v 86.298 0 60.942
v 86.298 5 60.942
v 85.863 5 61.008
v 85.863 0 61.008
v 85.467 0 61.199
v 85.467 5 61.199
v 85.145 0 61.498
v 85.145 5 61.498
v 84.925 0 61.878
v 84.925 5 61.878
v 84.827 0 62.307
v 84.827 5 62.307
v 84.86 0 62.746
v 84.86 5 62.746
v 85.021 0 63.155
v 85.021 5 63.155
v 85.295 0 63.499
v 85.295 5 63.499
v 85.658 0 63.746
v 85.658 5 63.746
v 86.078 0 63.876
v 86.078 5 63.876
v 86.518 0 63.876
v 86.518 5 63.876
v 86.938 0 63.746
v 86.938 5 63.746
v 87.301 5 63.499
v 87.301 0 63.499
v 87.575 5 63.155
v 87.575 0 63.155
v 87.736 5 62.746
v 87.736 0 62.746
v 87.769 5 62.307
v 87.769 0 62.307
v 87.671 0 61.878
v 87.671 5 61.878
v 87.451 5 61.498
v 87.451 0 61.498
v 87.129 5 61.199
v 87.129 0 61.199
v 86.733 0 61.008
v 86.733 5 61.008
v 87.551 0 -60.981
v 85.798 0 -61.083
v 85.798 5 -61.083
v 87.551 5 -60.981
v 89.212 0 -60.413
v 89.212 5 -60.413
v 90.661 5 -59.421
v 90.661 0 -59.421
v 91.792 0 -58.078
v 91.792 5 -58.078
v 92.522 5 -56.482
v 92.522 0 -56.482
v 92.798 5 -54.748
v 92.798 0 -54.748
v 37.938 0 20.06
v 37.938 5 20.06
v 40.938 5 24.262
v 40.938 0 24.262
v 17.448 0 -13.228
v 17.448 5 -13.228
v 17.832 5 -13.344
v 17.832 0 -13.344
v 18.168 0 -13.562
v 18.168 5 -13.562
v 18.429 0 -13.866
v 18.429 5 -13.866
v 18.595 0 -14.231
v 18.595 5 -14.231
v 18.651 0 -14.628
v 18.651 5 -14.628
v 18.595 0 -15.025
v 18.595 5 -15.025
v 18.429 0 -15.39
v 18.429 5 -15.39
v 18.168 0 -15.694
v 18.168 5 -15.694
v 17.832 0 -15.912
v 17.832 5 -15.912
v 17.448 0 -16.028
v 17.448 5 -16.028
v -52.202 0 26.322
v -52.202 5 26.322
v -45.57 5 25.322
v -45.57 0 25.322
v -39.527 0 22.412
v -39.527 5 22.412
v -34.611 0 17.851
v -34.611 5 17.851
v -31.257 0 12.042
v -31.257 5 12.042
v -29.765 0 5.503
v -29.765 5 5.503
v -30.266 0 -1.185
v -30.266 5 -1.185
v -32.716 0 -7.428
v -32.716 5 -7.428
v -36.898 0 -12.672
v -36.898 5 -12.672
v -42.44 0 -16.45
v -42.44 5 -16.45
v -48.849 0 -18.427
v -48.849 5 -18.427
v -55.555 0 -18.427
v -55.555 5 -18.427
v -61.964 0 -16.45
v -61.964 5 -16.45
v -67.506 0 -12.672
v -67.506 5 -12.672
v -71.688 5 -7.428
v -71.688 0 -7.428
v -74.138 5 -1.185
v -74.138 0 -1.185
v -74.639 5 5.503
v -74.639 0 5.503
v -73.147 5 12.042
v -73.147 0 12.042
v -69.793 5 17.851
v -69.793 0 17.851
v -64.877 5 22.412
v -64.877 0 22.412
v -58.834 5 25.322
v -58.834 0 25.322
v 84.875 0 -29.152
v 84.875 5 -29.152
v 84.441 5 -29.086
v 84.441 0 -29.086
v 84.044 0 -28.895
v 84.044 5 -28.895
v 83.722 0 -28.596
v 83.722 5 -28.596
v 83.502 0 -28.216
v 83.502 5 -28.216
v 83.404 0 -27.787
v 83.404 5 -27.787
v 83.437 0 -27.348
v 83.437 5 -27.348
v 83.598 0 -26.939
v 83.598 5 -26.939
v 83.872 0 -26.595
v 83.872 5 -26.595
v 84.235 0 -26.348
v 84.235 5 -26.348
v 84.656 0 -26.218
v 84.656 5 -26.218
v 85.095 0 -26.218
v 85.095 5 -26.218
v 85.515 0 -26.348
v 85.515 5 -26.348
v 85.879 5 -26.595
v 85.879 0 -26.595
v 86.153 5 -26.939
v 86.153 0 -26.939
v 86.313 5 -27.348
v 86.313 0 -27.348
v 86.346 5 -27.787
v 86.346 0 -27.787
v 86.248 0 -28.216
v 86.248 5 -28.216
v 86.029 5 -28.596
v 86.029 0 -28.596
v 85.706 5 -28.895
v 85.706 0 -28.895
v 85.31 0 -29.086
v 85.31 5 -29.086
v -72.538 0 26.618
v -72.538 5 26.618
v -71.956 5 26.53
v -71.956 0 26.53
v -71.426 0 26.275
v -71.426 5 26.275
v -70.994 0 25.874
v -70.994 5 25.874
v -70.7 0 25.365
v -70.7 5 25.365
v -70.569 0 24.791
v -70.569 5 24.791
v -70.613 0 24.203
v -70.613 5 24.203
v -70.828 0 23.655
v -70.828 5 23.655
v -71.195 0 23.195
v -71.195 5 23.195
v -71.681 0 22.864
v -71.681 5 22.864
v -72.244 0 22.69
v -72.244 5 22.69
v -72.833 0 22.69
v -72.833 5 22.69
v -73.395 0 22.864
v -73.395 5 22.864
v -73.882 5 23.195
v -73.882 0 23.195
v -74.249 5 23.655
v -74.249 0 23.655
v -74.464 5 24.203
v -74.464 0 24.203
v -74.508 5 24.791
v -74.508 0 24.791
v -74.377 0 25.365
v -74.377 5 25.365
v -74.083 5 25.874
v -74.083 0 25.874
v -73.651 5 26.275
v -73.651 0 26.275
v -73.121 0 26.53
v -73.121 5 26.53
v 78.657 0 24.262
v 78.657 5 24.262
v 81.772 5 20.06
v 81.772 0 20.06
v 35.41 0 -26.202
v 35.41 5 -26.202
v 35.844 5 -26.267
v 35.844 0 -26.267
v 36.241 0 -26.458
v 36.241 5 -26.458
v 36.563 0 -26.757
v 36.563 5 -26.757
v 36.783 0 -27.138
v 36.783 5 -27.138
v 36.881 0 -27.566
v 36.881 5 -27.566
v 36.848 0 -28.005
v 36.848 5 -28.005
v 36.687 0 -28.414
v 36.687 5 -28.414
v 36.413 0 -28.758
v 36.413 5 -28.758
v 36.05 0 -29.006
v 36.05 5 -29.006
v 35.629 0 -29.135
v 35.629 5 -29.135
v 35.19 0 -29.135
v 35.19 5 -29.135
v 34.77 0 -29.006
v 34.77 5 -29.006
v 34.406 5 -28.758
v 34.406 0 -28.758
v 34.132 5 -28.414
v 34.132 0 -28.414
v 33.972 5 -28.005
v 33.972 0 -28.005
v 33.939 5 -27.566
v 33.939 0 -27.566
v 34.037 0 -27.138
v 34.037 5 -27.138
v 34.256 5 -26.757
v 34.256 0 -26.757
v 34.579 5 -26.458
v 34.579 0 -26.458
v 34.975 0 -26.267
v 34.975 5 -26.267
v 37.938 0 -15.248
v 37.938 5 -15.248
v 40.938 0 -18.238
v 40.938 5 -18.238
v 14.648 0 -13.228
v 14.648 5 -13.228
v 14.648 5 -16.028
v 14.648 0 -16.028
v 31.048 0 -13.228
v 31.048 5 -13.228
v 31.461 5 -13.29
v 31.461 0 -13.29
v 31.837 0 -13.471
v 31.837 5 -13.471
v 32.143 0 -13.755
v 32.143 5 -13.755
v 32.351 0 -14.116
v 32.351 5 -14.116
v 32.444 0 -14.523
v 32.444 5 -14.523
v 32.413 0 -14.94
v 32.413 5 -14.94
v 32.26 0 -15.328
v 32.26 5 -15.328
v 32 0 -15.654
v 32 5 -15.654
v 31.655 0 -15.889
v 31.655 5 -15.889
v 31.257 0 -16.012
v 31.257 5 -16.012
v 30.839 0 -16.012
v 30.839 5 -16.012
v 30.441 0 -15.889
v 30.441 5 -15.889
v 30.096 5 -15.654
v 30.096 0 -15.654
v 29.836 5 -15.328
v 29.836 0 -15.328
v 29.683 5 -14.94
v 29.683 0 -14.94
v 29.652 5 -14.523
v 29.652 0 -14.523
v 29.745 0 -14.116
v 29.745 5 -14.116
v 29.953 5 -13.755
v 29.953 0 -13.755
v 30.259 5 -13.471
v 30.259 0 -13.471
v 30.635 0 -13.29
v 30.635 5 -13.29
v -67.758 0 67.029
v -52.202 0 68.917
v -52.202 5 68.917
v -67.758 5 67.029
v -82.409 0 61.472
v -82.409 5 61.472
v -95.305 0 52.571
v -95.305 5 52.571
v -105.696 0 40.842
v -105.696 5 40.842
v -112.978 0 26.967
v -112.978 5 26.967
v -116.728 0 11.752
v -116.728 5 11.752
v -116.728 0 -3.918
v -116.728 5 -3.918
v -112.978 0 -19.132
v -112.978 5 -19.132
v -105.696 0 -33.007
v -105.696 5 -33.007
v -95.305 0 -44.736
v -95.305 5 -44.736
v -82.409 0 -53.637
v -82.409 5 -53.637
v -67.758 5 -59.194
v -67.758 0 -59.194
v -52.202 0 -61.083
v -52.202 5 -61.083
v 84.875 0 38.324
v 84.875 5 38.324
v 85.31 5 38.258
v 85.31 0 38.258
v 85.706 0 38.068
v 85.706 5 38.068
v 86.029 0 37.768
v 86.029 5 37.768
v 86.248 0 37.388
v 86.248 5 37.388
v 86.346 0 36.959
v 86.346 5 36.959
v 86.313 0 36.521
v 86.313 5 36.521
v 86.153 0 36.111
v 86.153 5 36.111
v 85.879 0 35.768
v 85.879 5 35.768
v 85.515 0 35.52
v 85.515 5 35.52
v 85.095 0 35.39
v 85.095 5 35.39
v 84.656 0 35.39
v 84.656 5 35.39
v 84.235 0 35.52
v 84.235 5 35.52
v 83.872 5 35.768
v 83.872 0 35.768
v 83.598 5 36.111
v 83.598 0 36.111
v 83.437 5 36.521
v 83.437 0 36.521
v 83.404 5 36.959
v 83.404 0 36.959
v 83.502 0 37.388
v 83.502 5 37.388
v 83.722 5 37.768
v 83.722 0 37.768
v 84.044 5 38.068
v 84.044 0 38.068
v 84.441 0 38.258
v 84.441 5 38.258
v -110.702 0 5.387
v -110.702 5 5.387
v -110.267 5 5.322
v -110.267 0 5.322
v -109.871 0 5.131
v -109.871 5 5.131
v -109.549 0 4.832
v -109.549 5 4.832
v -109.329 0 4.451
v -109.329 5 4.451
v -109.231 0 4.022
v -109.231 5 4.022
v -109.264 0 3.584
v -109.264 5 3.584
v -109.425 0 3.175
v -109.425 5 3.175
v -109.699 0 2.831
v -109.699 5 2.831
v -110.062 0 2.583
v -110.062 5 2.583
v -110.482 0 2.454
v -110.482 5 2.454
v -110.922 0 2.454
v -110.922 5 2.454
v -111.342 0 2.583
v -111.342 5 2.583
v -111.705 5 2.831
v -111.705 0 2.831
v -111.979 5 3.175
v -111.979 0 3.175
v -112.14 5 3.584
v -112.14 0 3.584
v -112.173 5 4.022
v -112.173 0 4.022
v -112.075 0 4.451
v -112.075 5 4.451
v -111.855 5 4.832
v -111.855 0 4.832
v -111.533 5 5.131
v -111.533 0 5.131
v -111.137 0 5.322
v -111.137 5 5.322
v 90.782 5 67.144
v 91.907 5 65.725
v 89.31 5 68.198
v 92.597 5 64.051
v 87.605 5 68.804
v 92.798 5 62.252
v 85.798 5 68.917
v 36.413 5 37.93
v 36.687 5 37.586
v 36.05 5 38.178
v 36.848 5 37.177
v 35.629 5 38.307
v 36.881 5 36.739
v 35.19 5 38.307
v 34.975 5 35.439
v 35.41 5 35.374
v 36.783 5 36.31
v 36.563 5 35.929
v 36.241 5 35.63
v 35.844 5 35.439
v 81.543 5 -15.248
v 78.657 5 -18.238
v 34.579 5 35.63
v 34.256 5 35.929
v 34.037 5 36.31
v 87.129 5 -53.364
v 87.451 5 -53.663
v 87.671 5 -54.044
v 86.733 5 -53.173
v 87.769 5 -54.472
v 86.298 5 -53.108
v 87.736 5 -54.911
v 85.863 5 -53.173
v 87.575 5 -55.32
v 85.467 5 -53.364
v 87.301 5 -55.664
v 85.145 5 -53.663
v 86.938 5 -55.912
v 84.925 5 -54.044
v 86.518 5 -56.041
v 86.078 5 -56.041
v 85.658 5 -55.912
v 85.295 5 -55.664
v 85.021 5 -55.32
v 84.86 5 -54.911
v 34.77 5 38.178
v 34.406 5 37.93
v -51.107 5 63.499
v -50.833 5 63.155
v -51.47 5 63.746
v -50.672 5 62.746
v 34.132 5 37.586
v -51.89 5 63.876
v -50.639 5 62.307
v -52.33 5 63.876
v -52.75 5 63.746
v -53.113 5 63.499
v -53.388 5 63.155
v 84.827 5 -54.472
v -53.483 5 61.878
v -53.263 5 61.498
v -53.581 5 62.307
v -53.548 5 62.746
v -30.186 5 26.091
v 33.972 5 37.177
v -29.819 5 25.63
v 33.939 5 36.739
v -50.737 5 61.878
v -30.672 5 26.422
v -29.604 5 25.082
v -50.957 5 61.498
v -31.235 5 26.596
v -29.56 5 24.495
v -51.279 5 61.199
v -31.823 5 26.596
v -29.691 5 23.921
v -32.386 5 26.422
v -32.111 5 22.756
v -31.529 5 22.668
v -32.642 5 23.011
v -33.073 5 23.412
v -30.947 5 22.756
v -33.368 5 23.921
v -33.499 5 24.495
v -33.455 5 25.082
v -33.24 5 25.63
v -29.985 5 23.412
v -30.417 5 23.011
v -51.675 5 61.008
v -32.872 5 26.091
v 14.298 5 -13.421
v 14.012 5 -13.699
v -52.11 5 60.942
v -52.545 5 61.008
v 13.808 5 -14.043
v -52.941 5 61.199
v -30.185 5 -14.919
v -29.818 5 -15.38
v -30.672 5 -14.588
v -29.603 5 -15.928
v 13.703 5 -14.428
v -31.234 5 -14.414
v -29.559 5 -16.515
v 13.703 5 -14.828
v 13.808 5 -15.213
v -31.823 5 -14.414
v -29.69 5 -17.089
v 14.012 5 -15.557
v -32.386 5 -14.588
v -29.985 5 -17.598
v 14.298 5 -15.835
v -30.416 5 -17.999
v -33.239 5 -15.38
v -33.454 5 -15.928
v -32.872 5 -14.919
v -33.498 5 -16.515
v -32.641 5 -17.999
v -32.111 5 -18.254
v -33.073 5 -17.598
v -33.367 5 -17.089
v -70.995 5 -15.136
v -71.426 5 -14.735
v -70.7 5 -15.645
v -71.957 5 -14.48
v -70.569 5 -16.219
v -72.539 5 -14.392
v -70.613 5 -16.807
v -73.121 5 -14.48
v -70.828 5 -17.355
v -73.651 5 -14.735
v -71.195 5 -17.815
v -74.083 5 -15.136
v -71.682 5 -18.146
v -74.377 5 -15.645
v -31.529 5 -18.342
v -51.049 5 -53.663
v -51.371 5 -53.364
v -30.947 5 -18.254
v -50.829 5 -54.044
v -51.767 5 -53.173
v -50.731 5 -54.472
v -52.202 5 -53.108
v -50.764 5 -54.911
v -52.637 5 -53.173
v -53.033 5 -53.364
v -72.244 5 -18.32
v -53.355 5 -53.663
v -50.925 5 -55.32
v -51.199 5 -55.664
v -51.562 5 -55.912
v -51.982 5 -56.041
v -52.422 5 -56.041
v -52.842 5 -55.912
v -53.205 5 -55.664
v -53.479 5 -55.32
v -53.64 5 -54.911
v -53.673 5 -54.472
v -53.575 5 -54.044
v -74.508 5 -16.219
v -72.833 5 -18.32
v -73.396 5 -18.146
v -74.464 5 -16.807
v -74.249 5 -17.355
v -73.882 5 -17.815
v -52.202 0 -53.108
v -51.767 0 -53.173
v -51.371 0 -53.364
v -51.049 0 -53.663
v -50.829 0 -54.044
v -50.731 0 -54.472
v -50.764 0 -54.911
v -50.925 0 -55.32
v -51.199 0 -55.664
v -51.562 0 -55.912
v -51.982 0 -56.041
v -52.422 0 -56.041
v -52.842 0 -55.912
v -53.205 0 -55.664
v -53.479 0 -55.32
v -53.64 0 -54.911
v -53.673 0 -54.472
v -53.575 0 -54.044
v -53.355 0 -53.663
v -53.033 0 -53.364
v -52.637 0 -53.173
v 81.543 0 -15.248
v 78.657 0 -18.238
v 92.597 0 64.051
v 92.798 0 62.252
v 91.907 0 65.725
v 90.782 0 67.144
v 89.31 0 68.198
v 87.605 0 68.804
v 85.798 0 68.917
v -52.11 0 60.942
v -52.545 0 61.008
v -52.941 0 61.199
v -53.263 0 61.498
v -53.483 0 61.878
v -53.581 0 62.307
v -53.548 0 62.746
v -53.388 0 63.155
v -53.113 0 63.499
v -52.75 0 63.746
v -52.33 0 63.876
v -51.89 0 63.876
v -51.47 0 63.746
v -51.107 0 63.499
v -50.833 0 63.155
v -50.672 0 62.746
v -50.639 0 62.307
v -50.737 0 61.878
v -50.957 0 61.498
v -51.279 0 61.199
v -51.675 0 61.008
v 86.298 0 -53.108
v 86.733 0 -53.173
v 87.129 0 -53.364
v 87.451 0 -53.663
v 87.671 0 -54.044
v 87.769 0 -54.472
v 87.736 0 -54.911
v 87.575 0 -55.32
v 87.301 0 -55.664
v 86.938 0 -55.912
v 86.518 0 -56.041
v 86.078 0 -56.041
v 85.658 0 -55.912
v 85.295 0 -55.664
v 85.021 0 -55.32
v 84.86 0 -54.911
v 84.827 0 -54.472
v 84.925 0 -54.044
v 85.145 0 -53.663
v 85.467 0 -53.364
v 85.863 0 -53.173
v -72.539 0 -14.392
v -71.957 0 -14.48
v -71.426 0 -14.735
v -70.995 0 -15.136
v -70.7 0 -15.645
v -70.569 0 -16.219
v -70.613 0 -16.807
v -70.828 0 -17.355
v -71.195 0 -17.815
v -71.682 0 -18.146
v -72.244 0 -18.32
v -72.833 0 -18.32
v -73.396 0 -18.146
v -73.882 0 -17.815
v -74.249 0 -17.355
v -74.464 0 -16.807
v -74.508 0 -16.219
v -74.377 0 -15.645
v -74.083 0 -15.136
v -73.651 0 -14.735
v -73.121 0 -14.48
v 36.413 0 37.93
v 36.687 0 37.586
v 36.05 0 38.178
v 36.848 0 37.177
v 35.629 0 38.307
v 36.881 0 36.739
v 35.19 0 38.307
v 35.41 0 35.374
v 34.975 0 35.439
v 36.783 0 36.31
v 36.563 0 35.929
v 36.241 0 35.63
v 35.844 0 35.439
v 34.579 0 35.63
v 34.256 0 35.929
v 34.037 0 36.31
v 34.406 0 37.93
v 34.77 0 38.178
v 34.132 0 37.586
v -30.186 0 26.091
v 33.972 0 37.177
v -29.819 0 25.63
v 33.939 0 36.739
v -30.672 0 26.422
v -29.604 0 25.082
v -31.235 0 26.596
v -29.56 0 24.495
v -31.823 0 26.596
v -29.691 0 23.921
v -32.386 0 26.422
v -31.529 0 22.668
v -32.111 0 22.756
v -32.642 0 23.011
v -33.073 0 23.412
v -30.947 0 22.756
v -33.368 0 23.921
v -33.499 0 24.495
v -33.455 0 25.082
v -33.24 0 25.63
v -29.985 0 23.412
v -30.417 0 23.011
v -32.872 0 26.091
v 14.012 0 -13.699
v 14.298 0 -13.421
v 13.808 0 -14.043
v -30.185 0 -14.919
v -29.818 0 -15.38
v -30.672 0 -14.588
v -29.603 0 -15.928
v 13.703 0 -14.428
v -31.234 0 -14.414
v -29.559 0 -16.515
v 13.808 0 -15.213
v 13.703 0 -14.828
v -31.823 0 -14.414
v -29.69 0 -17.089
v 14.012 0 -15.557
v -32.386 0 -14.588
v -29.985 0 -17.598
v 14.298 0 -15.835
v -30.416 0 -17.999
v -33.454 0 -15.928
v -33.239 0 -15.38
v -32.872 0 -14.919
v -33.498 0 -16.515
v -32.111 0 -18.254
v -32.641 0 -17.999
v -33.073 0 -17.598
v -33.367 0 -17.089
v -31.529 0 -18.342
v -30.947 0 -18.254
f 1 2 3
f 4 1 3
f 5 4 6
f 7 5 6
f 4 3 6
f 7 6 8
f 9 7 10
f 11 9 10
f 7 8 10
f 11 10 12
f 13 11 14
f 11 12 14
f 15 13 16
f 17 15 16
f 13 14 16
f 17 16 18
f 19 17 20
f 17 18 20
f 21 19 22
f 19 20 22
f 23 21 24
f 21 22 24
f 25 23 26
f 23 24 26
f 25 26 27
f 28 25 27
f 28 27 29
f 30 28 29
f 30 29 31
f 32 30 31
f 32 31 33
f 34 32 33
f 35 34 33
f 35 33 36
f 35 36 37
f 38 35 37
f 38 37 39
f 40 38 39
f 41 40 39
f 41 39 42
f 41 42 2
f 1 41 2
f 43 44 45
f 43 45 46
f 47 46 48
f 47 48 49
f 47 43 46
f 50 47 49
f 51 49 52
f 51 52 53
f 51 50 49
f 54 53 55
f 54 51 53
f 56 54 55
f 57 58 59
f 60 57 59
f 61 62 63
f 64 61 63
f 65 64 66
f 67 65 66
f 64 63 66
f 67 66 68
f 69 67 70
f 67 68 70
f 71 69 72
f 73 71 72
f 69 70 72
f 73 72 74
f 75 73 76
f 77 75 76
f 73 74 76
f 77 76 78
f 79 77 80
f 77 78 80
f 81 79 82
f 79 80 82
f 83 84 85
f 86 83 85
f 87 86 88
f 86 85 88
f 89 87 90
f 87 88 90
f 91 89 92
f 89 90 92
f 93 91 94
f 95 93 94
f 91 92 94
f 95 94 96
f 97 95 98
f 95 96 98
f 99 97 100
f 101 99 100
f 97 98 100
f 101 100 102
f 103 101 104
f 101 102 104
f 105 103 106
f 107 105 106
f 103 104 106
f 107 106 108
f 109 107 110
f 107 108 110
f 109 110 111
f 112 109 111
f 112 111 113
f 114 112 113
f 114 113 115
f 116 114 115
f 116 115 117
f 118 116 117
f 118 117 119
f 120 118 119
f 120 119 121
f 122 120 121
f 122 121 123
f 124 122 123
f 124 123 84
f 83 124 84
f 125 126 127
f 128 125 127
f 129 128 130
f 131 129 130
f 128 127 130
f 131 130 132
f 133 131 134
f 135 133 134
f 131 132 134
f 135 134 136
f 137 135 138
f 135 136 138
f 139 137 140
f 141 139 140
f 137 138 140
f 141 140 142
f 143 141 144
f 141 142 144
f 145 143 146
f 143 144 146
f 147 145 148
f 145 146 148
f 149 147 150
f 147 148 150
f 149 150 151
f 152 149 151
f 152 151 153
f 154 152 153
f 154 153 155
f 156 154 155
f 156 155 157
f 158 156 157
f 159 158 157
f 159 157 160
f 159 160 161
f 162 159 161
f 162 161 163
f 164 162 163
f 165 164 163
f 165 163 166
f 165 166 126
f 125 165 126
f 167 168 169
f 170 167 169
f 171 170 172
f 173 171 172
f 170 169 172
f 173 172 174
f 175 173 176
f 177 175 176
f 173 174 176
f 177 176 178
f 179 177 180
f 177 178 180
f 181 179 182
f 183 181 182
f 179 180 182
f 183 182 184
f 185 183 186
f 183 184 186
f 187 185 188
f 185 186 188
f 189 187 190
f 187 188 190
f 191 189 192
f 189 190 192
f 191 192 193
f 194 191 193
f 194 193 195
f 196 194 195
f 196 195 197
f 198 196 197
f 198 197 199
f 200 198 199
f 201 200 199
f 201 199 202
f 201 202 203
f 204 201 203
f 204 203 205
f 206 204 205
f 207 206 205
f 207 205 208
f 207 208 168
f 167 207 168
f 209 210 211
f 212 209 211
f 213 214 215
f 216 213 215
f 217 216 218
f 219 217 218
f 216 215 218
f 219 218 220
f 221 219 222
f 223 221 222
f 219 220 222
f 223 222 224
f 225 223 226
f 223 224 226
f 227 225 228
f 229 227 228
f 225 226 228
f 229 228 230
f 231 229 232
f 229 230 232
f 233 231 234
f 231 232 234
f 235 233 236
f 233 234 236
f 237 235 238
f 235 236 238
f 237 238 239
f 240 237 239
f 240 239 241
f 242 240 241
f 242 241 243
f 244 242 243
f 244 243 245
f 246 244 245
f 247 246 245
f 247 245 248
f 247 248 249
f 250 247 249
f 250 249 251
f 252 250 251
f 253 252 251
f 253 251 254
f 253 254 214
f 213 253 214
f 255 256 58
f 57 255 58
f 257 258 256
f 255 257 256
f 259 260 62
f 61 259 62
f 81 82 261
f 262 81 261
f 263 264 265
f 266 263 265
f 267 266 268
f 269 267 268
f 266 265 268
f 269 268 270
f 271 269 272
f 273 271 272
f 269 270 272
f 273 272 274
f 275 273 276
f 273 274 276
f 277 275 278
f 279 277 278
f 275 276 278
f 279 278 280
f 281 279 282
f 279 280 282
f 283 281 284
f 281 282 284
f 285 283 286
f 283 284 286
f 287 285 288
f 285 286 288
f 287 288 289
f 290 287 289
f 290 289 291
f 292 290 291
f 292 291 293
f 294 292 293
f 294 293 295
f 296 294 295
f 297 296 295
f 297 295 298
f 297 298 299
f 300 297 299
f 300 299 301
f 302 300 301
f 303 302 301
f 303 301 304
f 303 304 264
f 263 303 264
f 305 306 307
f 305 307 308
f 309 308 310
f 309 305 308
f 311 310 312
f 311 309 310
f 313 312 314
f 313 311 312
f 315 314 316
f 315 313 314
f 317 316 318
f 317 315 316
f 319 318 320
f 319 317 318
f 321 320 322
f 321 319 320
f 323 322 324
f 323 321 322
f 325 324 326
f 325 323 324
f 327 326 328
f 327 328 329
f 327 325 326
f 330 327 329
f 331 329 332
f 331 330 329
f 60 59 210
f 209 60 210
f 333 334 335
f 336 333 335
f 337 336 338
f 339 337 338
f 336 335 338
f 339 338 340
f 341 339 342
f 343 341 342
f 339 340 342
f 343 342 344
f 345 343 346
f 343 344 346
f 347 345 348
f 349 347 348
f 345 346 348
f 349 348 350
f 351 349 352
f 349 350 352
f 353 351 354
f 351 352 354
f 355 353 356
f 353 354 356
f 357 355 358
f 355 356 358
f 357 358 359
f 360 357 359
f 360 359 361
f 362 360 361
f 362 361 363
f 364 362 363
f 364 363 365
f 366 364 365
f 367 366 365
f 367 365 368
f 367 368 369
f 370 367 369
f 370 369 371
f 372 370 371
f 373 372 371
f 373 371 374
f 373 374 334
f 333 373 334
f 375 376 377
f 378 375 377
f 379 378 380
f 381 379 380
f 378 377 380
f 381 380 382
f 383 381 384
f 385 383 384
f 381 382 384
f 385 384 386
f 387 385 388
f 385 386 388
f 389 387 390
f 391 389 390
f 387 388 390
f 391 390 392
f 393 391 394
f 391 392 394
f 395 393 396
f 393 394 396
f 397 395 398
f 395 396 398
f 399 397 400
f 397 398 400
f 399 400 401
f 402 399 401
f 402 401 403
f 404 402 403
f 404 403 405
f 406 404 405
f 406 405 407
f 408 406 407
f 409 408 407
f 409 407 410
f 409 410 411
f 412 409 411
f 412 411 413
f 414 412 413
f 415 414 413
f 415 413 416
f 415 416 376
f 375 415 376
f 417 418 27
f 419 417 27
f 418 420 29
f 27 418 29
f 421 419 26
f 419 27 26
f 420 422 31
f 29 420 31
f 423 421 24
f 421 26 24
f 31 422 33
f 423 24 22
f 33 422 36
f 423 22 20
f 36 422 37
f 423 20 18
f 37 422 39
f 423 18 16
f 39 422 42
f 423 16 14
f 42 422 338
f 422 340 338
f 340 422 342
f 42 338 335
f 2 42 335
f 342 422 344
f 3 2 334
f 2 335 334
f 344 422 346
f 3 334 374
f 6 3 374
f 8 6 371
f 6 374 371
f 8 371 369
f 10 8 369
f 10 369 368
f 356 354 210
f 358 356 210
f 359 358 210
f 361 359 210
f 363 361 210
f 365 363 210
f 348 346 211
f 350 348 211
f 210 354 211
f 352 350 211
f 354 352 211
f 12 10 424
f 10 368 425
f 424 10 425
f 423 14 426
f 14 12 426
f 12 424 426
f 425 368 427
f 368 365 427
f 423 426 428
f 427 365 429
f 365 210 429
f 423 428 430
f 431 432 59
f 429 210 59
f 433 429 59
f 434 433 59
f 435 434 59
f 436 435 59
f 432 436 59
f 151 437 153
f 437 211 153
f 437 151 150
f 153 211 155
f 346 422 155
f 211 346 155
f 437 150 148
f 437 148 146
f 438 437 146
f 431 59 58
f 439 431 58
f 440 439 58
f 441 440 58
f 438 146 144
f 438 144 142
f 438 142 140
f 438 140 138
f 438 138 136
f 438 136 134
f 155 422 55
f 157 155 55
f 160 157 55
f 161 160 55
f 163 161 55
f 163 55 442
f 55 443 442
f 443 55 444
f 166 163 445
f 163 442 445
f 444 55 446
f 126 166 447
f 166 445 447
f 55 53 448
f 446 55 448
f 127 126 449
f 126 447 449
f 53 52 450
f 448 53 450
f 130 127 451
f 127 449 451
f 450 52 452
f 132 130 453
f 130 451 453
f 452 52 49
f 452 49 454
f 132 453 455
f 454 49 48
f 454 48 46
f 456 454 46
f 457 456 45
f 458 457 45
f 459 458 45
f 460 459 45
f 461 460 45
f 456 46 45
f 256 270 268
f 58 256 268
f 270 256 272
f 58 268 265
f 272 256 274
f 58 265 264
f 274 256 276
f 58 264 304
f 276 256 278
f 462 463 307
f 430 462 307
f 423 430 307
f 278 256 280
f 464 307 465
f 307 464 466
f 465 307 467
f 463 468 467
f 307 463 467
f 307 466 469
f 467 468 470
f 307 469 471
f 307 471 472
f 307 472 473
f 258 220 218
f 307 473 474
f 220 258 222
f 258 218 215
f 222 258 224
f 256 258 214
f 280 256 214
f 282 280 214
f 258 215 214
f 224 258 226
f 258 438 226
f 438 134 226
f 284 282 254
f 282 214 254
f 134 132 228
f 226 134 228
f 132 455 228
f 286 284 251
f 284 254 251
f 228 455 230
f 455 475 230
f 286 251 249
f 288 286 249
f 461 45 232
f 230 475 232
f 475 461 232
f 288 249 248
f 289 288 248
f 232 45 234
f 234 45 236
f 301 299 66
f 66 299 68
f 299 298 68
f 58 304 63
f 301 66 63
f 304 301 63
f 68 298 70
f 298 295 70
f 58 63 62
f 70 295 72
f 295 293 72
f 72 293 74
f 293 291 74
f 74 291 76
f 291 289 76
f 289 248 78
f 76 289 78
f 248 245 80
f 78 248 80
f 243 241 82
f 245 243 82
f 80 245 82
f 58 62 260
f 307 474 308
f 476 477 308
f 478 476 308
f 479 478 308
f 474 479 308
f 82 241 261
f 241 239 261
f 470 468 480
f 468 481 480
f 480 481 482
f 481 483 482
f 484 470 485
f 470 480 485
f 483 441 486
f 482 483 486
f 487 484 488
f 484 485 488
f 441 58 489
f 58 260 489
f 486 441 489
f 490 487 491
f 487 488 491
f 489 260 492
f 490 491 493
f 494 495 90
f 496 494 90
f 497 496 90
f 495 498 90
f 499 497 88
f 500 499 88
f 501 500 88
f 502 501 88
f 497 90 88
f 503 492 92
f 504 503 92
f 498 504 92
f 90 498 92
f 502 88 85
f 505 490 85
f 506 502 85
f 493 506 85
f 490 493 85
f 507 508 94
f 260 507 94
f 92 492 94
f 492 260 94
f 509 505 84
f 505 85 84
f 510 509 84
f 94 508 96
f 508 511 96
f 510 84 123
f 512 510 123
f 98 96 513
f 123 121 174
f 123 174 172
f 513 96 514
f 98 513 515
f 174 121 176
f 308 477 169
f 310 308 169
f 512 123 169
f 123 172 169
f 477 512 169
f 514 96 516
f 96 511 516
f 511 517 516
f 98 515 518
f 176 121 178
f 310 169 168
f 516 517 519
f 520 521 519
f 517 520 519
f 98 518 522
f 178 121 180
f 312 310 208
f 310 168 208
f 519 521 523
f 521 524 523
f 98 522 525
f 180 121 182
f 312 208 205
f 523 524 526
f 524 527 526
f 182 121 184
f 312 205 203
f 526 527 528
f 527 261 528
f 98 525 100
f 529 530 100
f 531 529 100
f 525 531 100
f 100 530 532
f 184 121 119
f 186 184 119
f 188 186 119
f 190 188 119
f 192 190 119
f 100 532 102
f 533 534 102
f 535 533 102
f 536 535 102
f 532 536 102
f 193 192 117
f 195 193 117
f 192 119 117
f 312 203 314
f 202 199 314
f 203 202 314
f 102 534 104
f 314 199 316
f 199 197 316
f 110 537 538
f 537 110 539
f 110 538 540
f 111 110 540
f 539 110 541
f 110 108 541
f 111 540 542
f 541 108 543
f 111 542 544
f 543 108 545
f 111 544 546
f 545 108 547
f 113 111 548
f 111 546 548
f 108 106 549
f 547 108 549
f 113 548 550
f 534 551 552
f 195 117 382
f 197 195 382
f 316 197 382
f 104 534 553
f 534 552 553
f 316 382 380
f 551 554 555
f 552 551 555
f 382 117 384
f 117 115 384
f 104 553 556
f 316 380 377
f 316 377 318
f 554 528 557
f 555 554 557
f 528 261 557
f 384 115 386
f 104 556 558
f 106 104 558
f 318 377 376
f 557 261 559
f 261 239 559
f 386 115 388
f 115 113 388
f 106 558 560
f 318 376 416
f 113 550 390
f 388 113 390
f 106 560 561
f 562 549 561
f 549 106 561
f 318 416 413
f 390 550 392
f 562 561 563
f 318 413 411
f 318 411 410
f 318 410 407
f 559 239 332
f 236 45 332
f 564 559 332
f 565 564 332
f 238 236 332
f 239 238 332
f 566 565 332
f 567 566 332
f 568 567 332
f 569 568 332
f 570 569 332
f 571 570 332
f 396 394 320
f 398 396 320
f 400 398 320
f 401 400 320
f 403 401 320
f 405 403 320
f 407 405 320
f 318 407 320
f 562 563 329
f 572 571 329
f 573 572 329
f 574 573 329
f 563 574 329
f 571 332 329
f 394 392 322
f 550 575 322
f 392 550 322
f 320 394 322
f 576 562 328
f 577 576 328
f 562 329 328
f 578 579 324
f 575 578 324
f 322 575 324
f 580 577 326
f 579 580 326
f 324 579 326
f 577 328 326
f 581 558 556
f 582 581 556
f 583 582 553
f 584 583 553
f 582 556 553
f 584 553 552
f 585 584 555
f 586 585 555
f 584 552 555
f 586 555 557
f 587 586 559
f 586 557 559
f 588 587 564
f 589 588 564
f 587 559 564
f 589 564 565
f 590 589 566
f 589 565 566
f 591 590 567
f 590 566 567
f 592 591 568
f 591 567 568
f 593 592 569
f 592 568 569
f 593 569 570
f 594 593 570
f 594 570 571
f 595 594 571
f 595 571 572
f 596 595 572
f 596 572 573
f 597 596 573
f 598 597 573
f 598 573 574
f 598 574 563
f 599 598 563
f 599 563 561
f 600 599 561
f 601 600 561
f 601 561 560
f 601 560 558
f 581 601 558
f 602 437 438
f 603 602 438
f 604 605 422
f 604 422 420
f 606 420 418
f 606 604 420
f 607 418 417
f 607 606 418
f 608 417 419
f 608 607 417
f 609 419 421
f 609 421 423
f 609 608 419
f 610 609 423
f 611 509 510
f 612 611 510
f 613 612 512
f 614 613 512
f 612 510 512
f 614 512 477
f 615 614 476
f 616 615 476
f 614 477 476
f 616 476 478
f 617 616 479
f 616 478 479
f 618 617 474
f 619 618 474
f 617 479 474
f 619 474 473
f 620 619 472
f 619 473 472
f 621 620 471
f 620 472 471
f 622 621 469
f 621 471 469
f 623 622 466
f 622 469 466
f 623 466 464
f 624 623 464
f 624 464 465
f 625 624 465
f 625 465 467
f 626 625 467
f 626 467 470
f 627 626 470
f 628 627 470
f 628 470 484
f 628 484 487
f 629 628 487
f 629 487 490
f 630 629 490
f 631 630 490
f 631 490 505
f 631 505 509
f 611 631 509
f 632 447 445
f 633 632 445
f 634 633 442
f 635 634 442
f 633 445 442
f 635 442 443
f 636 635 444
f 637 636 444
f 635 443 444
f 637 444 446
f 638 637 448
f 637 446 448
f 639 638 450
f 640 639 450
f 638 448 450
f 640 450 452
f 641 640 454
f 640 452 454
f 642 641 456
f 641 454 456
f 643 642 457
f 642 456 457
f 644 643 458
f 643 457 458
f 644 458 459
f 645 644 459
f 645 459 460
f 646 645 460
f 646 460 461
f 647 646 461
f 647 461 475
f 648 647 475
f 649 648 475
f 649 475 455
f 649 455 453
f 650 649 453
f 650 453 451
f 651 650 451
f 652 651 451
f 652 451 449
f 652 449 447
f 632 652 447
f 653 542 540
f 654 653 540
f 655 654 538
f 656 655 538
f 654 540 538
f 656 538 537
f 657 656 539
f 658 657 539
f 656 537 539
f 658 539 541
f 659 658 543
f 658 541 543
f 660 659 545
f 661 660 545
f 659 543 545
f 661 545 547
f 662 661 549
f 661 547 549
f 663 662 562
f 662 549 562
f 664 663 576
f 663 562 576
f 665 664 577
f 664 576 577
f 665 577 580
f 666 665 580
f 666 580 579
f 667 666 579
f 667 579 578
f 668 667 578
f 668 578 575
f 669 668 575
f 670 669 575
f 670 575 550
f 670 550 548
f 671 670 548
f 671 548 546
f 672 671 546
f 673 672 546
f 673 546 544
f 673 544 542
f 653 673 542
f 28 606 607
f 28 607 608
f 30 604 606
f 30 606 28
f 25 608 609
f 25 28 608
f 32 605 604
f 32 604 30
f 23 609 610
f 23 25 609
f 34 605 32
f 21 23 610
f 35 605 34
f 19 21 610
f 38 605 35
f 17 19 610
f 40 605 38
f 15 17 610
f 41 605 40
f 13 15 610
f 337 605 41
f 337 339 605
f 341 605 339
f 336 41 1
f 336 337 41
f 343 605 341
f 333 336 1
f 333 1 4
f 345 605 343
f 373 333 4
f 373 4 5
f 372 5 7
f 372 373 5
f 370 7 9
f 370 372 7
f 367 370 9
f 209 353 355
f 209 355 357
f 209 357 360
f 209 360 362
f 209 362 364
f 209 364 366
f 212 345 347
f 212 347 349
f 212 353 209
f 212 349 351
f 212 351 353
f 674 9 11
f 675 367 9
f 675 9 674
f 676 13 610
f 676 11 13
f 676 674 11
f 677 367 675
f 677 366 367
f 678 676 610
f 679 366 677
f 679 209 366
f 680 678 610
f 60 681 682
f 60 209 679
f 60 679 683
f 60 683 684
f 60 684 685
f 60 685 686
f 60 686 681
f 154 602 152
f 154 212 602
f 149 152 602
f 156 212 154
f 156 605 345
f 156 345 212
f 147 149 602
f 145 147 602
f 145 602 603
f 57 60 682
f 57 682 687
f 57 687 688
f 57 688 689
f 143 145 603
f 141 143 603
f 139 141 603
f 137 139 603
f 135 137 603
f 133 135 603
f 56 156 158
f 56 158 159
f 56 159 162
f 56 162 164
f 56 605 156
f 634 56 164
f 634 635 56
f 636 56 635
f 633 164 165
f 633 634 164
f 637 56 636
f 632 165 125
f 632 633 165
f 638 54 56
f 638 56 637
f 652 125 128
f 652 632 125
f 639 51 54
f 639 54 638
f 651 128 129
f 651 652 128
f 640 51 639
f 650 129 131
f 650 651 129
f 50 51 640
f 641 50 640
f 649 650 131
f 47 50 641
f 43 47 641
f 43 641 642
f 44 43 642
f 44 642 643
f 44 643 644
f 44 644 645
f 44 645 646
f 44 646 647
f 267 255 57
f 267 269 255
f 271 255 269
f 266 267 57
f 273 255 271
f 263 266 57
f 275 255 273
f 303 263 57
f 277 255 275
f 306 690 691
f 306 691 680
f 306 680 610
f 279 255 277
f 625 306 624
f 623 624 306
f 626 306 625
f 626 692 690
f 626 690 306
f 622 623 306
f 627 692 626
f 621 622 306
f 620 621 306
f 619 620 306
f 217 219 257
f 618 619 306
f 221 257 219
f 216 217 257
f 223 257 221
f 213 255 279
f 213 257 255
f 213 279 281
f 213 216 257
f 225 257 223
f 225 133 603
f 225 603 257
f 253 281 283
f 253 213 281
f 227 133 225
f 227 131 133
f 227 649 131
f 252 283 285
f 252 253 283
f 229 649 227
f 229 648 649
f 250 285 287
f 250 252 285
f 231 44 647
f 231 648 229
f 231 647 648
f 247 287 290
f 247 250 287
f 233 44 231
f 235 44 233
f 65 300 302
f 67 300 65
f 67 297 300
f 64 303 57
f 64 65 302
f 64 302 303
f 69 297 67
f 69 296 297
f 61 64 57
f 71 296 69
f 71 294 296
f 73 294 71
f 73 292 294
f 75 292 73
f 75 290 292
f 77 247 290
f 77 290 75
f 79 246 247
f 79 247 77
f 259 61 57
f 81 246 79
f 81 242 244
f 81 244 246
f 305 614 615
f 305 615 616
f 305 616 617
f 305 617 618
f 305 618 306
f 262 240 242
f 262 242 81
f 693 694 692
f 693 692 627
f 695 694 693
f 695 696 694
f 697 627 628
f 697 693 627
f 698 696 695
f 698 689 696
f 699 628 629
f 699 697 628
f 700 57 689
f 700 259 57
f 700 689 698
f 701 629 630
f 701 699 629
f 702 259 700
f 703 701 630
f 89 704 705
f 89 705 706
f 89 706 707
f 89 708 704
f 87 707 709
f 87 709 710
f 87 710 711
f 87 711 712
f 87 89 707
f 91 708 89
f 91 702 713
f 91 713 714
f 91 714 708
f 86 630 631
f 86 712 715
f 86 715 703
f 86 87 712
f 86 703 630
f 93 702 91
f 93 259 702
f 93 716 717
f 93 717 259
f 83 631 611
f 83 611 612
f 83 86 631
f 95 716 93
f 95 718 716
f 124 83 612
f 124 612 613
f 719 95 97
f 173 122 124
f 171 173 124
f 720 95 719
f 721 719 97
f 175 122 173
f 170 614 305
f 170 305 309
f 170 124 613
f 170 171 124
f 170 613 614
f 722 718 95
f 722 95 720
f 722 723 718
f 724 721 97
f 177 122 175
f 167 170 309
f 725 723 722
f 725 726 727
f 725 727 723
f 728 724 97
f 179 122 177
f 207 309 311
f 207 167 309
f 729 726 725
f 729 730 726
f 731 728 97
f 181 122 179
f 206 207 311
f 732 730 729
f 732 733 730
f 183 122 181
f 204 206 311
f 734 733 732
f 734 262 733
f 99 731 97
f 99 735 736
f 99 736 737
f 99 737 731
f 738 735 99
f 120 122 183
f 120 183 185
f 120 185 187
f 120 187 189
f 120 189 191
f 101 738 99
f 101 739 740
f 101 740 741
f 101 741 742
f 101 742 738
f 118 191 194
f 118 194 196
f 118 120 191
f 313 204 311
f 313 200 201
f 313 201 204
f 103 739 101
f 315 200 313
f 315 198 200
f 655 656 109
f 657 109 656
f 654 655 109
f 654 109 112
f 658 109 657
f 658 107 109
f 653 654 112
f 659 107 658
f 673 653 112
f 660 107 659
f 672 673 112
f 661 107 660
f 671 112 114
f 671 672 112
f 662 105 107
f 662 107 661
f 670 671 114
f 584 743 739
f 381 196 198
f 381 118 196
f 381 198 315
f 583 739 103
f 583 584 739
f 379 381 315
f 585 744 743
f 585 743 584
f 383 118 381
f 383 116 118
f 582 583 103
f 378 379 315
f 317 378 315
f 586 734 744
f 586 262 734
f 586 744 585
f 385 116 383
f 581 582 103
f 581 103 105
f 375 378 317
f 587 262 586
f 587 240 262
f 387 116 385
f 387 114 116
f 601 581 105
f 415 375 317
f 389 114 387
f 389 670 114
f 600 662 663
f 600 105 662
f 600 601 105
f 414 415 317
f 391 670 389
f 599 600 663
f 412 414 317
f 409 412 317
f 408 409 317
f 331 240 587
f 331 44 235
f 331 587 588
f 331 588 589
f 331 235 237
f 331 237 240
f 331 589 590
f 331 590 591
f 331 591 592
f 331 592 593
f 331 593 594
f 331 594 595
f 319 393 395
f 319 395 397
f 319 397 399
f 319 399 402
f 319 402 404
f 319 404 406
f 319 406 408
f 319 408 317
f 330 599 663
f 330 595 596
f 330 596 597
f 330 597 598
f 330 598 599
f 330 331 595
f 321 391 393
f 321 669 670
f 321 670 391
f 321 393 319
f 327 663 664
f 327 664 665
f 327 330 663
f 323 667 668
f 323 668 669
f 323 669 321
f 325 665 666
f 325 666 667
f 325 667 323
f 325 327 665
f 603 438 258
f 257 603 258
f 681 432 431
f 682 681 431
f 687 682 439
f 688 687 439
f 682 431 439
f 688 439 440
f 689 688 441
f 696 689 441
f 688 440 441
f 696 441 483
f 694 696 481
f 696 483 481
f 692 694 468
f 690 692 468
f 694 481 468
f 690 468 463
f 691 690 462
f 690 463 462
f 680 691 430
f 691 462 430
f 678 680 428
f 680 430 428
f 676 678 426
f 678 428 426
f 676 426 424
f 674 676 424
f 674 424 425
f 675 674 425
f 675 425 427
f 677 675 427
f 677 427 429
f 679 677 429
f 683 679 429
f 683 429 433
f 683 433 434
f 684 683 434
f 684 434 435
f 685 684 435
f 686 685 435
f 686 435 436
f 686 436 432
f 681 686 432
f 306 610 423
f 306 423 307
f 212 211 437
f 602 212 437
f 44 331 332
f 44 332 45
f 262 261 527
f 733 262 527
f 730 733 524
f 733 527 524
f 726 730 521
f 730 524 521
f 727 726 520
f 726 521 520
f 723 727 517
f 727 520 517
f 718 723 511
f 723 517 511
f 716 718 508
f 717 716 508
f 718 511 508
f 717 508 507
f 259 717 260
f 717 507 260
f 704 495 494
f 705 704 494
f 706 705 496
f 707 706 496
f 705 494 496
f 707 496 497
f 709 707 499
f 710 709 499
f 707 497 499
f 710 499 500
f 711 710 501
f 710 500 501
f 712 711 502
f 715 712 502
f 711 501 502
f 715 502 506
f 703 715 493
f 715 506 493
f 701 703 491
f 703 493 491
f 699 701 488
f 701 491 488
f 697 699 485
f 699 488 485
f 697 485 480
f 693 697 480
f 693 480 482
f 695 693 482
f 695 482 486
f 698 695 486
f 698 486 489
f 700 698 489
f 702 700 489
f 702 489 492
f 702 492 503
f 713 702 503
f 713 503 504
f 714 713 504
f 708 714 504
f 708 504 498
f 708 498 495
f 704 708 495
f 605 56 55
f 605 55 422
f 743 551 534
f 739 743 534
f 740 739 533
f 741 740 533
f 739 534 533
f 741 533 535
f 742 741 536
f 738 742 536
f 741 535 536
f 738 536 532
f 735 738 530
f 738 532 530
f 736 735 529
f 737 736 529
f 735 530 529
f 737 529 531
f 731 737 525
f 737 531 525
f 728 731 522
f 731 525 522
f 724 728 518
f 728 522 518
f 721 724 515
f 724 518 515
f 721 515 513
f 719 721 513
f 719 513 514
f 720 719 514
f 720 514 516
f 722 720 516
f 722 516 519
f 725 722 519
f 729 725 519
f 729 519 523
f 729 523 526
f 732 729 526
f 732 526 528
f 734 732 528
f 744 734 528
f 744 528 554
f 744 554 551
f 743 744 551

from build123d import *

# Parameters (mm, degrees)
BOSS_EXTRUDE1_DEPTH = 5
SKETCH3_R           = 1.475
CUT_EXTRUDE1_DEPTH  = 137.064643721
SKETCH4_R           = 22.5
SKETCH4_R_2         = 1.975
SKETCH4_R_3         = 1.4
SKETCH4_R_4         = 1.475
CUT_EXTRUDE2_DEPTH  = 137.064643721


with BuildPart() as part:
    # Sketch2 → Boss-Extrude1 (new body)
    with BuildSketch(Plane(origin=(0, 0, 0), x_dir=(1, 0, 0), z_dir=(0, 1, 0))):
        with BuildLine():
            Line((-52.202038886, 61.082677165), (85.797961114, 61.082677165))
            ThreePointArc((85.797961114, 61.082677165), (90.6611457, 59.421487905), (92.797961114, 54.747717054))
            Line((92.797961114, 54.747717054), (92.797961114, -62.252282946))
            ThreePointArc((92.797961114, -62.252282946), (90.782438223, -67.143884297), (85.797961114, -68.917322835))
            Line((85.797961114, -68.917322835), (-52.202038886, -68.917322835))
            ThreePointArc((-52.202038886, -68.917322835), (-117.202038886, -3.917322835), (-52.202038886, 61.082677165))
        make_face()
    extrude(amount=BOSS_EXTRUDE1_DEPTH)

    # Sketch3 → Cut-Extrude1 (cut, through all)
    with BuildSketch(Plane(origin=(0, 5, 0), x_dir=(1, 0, 0), z_dir=(0, 1, 0))):
        with Locations(Location((86.297961114, 54.582677165, 0), (0, 0, 270))):
            Circle(SKETCH3_R)
        with Locations(Location((-52.202038886, 54.582677165, 0), (0, 0, 270))):
            Circle(SKETCH3_R)
        with Locations(Location((-110.702038886, -3.912214457, 0), (0, 0, 270))):
            Circle(SKETCH3_R)
        with Locations(Location((86.297961114, -62.417322835, 0), (0, 0, 90))):
            Circle(SKETCH3_R)
        with Locations(Location((-52.110168441, -62.417322835, 0), (0, 0, 90))):
            Circle(SKETCH3_R)
    extrude(amount=-CUT_EXTRUDE1_DEPTH, mode=Mode.SUBTRACT)

    # Sketch4 → Cut-Extrude2 (cut, through all)
    with BuildSketch(Plane(origin=(0, 5, 0), x_dir=(1, 0, 0), z_dir=(0, 1, 0))):
        with Locations(Location((-52.202038886, -3.822023973, 0), (0, 0, 270))):
            Circle(SKETCH4_R)
        with Locations(Location((-72.538754153, 16.367031882, 0), (0, 0, 270))):
            Circle(SKETCH4_R_2)
        with Locations(Location((31.047961114, 14.627976027, 0), (0, 0, 270))):
            Circle(SKETCH4_R_3)
        with Locations(Location((35.409642143, 27.67666392, 0), (0, 0, 270))):
            Circle(SKETCH4_R_4)
        with Locations(Location((84.87537154, 27.67666392, 0), (0, 0, 90))):
            Circle(SKETCH4_R_4)
        with Locations(Location((84.87537154, -36.84883921, 0), (0, 0, 270))):
            Circle(SKETCH4_R_4)
        with Locations(Location((35.409642143, -36.84883921, 0), (0, 0, 90))):
            Circle(SKETCH4_R_4)
        with Locations(Location((-72.538388848, -24.642968116, 0), (0, 0, 270))):
            Circle(SKETCH4_R_2)
        with Locations(Location((-31.529119459, -24.642968116, 0), (0, 0, 90))):
            Circle(SKETCH4_R_2)
        with Locations(Location((-31.528754153, 16.367031882, 0), (0, 0, 90))):
            Circle(SKETCH4_R_2)
        Polygon((37.938439462, 15.24849763), (37.938439462, -20.06020818), (40.938439462, -24.262255151), (78.657482766, -24.262255151), (81.772324977, -20.06020818), (81.542640555, 15.24849763), (78.657482766, 18.237744849), (40.938439462, 18.237744849), align=None)
        with BuildLine():
            Line((17.447961114, 16.027976027), (14.647961114, 16.027976027))
            ThreePointArc((14.647961114, 16.027976027), (13.689795357, 14.627976027), (14.647961114, 13.227976027))
            Line((14.647961114, 13.227976027), (17.447961114, 13.227976027))
            ThreePointArc((17.447961114, 13.227976027), (18.651293074, 14.627976027), (17.447961114, 16.027976027))
        make_face()
    extrude(amount=-CUT_EXTRUDE2_DEPTH, mode=Mode.SUBTRACT)


solid = part.part
